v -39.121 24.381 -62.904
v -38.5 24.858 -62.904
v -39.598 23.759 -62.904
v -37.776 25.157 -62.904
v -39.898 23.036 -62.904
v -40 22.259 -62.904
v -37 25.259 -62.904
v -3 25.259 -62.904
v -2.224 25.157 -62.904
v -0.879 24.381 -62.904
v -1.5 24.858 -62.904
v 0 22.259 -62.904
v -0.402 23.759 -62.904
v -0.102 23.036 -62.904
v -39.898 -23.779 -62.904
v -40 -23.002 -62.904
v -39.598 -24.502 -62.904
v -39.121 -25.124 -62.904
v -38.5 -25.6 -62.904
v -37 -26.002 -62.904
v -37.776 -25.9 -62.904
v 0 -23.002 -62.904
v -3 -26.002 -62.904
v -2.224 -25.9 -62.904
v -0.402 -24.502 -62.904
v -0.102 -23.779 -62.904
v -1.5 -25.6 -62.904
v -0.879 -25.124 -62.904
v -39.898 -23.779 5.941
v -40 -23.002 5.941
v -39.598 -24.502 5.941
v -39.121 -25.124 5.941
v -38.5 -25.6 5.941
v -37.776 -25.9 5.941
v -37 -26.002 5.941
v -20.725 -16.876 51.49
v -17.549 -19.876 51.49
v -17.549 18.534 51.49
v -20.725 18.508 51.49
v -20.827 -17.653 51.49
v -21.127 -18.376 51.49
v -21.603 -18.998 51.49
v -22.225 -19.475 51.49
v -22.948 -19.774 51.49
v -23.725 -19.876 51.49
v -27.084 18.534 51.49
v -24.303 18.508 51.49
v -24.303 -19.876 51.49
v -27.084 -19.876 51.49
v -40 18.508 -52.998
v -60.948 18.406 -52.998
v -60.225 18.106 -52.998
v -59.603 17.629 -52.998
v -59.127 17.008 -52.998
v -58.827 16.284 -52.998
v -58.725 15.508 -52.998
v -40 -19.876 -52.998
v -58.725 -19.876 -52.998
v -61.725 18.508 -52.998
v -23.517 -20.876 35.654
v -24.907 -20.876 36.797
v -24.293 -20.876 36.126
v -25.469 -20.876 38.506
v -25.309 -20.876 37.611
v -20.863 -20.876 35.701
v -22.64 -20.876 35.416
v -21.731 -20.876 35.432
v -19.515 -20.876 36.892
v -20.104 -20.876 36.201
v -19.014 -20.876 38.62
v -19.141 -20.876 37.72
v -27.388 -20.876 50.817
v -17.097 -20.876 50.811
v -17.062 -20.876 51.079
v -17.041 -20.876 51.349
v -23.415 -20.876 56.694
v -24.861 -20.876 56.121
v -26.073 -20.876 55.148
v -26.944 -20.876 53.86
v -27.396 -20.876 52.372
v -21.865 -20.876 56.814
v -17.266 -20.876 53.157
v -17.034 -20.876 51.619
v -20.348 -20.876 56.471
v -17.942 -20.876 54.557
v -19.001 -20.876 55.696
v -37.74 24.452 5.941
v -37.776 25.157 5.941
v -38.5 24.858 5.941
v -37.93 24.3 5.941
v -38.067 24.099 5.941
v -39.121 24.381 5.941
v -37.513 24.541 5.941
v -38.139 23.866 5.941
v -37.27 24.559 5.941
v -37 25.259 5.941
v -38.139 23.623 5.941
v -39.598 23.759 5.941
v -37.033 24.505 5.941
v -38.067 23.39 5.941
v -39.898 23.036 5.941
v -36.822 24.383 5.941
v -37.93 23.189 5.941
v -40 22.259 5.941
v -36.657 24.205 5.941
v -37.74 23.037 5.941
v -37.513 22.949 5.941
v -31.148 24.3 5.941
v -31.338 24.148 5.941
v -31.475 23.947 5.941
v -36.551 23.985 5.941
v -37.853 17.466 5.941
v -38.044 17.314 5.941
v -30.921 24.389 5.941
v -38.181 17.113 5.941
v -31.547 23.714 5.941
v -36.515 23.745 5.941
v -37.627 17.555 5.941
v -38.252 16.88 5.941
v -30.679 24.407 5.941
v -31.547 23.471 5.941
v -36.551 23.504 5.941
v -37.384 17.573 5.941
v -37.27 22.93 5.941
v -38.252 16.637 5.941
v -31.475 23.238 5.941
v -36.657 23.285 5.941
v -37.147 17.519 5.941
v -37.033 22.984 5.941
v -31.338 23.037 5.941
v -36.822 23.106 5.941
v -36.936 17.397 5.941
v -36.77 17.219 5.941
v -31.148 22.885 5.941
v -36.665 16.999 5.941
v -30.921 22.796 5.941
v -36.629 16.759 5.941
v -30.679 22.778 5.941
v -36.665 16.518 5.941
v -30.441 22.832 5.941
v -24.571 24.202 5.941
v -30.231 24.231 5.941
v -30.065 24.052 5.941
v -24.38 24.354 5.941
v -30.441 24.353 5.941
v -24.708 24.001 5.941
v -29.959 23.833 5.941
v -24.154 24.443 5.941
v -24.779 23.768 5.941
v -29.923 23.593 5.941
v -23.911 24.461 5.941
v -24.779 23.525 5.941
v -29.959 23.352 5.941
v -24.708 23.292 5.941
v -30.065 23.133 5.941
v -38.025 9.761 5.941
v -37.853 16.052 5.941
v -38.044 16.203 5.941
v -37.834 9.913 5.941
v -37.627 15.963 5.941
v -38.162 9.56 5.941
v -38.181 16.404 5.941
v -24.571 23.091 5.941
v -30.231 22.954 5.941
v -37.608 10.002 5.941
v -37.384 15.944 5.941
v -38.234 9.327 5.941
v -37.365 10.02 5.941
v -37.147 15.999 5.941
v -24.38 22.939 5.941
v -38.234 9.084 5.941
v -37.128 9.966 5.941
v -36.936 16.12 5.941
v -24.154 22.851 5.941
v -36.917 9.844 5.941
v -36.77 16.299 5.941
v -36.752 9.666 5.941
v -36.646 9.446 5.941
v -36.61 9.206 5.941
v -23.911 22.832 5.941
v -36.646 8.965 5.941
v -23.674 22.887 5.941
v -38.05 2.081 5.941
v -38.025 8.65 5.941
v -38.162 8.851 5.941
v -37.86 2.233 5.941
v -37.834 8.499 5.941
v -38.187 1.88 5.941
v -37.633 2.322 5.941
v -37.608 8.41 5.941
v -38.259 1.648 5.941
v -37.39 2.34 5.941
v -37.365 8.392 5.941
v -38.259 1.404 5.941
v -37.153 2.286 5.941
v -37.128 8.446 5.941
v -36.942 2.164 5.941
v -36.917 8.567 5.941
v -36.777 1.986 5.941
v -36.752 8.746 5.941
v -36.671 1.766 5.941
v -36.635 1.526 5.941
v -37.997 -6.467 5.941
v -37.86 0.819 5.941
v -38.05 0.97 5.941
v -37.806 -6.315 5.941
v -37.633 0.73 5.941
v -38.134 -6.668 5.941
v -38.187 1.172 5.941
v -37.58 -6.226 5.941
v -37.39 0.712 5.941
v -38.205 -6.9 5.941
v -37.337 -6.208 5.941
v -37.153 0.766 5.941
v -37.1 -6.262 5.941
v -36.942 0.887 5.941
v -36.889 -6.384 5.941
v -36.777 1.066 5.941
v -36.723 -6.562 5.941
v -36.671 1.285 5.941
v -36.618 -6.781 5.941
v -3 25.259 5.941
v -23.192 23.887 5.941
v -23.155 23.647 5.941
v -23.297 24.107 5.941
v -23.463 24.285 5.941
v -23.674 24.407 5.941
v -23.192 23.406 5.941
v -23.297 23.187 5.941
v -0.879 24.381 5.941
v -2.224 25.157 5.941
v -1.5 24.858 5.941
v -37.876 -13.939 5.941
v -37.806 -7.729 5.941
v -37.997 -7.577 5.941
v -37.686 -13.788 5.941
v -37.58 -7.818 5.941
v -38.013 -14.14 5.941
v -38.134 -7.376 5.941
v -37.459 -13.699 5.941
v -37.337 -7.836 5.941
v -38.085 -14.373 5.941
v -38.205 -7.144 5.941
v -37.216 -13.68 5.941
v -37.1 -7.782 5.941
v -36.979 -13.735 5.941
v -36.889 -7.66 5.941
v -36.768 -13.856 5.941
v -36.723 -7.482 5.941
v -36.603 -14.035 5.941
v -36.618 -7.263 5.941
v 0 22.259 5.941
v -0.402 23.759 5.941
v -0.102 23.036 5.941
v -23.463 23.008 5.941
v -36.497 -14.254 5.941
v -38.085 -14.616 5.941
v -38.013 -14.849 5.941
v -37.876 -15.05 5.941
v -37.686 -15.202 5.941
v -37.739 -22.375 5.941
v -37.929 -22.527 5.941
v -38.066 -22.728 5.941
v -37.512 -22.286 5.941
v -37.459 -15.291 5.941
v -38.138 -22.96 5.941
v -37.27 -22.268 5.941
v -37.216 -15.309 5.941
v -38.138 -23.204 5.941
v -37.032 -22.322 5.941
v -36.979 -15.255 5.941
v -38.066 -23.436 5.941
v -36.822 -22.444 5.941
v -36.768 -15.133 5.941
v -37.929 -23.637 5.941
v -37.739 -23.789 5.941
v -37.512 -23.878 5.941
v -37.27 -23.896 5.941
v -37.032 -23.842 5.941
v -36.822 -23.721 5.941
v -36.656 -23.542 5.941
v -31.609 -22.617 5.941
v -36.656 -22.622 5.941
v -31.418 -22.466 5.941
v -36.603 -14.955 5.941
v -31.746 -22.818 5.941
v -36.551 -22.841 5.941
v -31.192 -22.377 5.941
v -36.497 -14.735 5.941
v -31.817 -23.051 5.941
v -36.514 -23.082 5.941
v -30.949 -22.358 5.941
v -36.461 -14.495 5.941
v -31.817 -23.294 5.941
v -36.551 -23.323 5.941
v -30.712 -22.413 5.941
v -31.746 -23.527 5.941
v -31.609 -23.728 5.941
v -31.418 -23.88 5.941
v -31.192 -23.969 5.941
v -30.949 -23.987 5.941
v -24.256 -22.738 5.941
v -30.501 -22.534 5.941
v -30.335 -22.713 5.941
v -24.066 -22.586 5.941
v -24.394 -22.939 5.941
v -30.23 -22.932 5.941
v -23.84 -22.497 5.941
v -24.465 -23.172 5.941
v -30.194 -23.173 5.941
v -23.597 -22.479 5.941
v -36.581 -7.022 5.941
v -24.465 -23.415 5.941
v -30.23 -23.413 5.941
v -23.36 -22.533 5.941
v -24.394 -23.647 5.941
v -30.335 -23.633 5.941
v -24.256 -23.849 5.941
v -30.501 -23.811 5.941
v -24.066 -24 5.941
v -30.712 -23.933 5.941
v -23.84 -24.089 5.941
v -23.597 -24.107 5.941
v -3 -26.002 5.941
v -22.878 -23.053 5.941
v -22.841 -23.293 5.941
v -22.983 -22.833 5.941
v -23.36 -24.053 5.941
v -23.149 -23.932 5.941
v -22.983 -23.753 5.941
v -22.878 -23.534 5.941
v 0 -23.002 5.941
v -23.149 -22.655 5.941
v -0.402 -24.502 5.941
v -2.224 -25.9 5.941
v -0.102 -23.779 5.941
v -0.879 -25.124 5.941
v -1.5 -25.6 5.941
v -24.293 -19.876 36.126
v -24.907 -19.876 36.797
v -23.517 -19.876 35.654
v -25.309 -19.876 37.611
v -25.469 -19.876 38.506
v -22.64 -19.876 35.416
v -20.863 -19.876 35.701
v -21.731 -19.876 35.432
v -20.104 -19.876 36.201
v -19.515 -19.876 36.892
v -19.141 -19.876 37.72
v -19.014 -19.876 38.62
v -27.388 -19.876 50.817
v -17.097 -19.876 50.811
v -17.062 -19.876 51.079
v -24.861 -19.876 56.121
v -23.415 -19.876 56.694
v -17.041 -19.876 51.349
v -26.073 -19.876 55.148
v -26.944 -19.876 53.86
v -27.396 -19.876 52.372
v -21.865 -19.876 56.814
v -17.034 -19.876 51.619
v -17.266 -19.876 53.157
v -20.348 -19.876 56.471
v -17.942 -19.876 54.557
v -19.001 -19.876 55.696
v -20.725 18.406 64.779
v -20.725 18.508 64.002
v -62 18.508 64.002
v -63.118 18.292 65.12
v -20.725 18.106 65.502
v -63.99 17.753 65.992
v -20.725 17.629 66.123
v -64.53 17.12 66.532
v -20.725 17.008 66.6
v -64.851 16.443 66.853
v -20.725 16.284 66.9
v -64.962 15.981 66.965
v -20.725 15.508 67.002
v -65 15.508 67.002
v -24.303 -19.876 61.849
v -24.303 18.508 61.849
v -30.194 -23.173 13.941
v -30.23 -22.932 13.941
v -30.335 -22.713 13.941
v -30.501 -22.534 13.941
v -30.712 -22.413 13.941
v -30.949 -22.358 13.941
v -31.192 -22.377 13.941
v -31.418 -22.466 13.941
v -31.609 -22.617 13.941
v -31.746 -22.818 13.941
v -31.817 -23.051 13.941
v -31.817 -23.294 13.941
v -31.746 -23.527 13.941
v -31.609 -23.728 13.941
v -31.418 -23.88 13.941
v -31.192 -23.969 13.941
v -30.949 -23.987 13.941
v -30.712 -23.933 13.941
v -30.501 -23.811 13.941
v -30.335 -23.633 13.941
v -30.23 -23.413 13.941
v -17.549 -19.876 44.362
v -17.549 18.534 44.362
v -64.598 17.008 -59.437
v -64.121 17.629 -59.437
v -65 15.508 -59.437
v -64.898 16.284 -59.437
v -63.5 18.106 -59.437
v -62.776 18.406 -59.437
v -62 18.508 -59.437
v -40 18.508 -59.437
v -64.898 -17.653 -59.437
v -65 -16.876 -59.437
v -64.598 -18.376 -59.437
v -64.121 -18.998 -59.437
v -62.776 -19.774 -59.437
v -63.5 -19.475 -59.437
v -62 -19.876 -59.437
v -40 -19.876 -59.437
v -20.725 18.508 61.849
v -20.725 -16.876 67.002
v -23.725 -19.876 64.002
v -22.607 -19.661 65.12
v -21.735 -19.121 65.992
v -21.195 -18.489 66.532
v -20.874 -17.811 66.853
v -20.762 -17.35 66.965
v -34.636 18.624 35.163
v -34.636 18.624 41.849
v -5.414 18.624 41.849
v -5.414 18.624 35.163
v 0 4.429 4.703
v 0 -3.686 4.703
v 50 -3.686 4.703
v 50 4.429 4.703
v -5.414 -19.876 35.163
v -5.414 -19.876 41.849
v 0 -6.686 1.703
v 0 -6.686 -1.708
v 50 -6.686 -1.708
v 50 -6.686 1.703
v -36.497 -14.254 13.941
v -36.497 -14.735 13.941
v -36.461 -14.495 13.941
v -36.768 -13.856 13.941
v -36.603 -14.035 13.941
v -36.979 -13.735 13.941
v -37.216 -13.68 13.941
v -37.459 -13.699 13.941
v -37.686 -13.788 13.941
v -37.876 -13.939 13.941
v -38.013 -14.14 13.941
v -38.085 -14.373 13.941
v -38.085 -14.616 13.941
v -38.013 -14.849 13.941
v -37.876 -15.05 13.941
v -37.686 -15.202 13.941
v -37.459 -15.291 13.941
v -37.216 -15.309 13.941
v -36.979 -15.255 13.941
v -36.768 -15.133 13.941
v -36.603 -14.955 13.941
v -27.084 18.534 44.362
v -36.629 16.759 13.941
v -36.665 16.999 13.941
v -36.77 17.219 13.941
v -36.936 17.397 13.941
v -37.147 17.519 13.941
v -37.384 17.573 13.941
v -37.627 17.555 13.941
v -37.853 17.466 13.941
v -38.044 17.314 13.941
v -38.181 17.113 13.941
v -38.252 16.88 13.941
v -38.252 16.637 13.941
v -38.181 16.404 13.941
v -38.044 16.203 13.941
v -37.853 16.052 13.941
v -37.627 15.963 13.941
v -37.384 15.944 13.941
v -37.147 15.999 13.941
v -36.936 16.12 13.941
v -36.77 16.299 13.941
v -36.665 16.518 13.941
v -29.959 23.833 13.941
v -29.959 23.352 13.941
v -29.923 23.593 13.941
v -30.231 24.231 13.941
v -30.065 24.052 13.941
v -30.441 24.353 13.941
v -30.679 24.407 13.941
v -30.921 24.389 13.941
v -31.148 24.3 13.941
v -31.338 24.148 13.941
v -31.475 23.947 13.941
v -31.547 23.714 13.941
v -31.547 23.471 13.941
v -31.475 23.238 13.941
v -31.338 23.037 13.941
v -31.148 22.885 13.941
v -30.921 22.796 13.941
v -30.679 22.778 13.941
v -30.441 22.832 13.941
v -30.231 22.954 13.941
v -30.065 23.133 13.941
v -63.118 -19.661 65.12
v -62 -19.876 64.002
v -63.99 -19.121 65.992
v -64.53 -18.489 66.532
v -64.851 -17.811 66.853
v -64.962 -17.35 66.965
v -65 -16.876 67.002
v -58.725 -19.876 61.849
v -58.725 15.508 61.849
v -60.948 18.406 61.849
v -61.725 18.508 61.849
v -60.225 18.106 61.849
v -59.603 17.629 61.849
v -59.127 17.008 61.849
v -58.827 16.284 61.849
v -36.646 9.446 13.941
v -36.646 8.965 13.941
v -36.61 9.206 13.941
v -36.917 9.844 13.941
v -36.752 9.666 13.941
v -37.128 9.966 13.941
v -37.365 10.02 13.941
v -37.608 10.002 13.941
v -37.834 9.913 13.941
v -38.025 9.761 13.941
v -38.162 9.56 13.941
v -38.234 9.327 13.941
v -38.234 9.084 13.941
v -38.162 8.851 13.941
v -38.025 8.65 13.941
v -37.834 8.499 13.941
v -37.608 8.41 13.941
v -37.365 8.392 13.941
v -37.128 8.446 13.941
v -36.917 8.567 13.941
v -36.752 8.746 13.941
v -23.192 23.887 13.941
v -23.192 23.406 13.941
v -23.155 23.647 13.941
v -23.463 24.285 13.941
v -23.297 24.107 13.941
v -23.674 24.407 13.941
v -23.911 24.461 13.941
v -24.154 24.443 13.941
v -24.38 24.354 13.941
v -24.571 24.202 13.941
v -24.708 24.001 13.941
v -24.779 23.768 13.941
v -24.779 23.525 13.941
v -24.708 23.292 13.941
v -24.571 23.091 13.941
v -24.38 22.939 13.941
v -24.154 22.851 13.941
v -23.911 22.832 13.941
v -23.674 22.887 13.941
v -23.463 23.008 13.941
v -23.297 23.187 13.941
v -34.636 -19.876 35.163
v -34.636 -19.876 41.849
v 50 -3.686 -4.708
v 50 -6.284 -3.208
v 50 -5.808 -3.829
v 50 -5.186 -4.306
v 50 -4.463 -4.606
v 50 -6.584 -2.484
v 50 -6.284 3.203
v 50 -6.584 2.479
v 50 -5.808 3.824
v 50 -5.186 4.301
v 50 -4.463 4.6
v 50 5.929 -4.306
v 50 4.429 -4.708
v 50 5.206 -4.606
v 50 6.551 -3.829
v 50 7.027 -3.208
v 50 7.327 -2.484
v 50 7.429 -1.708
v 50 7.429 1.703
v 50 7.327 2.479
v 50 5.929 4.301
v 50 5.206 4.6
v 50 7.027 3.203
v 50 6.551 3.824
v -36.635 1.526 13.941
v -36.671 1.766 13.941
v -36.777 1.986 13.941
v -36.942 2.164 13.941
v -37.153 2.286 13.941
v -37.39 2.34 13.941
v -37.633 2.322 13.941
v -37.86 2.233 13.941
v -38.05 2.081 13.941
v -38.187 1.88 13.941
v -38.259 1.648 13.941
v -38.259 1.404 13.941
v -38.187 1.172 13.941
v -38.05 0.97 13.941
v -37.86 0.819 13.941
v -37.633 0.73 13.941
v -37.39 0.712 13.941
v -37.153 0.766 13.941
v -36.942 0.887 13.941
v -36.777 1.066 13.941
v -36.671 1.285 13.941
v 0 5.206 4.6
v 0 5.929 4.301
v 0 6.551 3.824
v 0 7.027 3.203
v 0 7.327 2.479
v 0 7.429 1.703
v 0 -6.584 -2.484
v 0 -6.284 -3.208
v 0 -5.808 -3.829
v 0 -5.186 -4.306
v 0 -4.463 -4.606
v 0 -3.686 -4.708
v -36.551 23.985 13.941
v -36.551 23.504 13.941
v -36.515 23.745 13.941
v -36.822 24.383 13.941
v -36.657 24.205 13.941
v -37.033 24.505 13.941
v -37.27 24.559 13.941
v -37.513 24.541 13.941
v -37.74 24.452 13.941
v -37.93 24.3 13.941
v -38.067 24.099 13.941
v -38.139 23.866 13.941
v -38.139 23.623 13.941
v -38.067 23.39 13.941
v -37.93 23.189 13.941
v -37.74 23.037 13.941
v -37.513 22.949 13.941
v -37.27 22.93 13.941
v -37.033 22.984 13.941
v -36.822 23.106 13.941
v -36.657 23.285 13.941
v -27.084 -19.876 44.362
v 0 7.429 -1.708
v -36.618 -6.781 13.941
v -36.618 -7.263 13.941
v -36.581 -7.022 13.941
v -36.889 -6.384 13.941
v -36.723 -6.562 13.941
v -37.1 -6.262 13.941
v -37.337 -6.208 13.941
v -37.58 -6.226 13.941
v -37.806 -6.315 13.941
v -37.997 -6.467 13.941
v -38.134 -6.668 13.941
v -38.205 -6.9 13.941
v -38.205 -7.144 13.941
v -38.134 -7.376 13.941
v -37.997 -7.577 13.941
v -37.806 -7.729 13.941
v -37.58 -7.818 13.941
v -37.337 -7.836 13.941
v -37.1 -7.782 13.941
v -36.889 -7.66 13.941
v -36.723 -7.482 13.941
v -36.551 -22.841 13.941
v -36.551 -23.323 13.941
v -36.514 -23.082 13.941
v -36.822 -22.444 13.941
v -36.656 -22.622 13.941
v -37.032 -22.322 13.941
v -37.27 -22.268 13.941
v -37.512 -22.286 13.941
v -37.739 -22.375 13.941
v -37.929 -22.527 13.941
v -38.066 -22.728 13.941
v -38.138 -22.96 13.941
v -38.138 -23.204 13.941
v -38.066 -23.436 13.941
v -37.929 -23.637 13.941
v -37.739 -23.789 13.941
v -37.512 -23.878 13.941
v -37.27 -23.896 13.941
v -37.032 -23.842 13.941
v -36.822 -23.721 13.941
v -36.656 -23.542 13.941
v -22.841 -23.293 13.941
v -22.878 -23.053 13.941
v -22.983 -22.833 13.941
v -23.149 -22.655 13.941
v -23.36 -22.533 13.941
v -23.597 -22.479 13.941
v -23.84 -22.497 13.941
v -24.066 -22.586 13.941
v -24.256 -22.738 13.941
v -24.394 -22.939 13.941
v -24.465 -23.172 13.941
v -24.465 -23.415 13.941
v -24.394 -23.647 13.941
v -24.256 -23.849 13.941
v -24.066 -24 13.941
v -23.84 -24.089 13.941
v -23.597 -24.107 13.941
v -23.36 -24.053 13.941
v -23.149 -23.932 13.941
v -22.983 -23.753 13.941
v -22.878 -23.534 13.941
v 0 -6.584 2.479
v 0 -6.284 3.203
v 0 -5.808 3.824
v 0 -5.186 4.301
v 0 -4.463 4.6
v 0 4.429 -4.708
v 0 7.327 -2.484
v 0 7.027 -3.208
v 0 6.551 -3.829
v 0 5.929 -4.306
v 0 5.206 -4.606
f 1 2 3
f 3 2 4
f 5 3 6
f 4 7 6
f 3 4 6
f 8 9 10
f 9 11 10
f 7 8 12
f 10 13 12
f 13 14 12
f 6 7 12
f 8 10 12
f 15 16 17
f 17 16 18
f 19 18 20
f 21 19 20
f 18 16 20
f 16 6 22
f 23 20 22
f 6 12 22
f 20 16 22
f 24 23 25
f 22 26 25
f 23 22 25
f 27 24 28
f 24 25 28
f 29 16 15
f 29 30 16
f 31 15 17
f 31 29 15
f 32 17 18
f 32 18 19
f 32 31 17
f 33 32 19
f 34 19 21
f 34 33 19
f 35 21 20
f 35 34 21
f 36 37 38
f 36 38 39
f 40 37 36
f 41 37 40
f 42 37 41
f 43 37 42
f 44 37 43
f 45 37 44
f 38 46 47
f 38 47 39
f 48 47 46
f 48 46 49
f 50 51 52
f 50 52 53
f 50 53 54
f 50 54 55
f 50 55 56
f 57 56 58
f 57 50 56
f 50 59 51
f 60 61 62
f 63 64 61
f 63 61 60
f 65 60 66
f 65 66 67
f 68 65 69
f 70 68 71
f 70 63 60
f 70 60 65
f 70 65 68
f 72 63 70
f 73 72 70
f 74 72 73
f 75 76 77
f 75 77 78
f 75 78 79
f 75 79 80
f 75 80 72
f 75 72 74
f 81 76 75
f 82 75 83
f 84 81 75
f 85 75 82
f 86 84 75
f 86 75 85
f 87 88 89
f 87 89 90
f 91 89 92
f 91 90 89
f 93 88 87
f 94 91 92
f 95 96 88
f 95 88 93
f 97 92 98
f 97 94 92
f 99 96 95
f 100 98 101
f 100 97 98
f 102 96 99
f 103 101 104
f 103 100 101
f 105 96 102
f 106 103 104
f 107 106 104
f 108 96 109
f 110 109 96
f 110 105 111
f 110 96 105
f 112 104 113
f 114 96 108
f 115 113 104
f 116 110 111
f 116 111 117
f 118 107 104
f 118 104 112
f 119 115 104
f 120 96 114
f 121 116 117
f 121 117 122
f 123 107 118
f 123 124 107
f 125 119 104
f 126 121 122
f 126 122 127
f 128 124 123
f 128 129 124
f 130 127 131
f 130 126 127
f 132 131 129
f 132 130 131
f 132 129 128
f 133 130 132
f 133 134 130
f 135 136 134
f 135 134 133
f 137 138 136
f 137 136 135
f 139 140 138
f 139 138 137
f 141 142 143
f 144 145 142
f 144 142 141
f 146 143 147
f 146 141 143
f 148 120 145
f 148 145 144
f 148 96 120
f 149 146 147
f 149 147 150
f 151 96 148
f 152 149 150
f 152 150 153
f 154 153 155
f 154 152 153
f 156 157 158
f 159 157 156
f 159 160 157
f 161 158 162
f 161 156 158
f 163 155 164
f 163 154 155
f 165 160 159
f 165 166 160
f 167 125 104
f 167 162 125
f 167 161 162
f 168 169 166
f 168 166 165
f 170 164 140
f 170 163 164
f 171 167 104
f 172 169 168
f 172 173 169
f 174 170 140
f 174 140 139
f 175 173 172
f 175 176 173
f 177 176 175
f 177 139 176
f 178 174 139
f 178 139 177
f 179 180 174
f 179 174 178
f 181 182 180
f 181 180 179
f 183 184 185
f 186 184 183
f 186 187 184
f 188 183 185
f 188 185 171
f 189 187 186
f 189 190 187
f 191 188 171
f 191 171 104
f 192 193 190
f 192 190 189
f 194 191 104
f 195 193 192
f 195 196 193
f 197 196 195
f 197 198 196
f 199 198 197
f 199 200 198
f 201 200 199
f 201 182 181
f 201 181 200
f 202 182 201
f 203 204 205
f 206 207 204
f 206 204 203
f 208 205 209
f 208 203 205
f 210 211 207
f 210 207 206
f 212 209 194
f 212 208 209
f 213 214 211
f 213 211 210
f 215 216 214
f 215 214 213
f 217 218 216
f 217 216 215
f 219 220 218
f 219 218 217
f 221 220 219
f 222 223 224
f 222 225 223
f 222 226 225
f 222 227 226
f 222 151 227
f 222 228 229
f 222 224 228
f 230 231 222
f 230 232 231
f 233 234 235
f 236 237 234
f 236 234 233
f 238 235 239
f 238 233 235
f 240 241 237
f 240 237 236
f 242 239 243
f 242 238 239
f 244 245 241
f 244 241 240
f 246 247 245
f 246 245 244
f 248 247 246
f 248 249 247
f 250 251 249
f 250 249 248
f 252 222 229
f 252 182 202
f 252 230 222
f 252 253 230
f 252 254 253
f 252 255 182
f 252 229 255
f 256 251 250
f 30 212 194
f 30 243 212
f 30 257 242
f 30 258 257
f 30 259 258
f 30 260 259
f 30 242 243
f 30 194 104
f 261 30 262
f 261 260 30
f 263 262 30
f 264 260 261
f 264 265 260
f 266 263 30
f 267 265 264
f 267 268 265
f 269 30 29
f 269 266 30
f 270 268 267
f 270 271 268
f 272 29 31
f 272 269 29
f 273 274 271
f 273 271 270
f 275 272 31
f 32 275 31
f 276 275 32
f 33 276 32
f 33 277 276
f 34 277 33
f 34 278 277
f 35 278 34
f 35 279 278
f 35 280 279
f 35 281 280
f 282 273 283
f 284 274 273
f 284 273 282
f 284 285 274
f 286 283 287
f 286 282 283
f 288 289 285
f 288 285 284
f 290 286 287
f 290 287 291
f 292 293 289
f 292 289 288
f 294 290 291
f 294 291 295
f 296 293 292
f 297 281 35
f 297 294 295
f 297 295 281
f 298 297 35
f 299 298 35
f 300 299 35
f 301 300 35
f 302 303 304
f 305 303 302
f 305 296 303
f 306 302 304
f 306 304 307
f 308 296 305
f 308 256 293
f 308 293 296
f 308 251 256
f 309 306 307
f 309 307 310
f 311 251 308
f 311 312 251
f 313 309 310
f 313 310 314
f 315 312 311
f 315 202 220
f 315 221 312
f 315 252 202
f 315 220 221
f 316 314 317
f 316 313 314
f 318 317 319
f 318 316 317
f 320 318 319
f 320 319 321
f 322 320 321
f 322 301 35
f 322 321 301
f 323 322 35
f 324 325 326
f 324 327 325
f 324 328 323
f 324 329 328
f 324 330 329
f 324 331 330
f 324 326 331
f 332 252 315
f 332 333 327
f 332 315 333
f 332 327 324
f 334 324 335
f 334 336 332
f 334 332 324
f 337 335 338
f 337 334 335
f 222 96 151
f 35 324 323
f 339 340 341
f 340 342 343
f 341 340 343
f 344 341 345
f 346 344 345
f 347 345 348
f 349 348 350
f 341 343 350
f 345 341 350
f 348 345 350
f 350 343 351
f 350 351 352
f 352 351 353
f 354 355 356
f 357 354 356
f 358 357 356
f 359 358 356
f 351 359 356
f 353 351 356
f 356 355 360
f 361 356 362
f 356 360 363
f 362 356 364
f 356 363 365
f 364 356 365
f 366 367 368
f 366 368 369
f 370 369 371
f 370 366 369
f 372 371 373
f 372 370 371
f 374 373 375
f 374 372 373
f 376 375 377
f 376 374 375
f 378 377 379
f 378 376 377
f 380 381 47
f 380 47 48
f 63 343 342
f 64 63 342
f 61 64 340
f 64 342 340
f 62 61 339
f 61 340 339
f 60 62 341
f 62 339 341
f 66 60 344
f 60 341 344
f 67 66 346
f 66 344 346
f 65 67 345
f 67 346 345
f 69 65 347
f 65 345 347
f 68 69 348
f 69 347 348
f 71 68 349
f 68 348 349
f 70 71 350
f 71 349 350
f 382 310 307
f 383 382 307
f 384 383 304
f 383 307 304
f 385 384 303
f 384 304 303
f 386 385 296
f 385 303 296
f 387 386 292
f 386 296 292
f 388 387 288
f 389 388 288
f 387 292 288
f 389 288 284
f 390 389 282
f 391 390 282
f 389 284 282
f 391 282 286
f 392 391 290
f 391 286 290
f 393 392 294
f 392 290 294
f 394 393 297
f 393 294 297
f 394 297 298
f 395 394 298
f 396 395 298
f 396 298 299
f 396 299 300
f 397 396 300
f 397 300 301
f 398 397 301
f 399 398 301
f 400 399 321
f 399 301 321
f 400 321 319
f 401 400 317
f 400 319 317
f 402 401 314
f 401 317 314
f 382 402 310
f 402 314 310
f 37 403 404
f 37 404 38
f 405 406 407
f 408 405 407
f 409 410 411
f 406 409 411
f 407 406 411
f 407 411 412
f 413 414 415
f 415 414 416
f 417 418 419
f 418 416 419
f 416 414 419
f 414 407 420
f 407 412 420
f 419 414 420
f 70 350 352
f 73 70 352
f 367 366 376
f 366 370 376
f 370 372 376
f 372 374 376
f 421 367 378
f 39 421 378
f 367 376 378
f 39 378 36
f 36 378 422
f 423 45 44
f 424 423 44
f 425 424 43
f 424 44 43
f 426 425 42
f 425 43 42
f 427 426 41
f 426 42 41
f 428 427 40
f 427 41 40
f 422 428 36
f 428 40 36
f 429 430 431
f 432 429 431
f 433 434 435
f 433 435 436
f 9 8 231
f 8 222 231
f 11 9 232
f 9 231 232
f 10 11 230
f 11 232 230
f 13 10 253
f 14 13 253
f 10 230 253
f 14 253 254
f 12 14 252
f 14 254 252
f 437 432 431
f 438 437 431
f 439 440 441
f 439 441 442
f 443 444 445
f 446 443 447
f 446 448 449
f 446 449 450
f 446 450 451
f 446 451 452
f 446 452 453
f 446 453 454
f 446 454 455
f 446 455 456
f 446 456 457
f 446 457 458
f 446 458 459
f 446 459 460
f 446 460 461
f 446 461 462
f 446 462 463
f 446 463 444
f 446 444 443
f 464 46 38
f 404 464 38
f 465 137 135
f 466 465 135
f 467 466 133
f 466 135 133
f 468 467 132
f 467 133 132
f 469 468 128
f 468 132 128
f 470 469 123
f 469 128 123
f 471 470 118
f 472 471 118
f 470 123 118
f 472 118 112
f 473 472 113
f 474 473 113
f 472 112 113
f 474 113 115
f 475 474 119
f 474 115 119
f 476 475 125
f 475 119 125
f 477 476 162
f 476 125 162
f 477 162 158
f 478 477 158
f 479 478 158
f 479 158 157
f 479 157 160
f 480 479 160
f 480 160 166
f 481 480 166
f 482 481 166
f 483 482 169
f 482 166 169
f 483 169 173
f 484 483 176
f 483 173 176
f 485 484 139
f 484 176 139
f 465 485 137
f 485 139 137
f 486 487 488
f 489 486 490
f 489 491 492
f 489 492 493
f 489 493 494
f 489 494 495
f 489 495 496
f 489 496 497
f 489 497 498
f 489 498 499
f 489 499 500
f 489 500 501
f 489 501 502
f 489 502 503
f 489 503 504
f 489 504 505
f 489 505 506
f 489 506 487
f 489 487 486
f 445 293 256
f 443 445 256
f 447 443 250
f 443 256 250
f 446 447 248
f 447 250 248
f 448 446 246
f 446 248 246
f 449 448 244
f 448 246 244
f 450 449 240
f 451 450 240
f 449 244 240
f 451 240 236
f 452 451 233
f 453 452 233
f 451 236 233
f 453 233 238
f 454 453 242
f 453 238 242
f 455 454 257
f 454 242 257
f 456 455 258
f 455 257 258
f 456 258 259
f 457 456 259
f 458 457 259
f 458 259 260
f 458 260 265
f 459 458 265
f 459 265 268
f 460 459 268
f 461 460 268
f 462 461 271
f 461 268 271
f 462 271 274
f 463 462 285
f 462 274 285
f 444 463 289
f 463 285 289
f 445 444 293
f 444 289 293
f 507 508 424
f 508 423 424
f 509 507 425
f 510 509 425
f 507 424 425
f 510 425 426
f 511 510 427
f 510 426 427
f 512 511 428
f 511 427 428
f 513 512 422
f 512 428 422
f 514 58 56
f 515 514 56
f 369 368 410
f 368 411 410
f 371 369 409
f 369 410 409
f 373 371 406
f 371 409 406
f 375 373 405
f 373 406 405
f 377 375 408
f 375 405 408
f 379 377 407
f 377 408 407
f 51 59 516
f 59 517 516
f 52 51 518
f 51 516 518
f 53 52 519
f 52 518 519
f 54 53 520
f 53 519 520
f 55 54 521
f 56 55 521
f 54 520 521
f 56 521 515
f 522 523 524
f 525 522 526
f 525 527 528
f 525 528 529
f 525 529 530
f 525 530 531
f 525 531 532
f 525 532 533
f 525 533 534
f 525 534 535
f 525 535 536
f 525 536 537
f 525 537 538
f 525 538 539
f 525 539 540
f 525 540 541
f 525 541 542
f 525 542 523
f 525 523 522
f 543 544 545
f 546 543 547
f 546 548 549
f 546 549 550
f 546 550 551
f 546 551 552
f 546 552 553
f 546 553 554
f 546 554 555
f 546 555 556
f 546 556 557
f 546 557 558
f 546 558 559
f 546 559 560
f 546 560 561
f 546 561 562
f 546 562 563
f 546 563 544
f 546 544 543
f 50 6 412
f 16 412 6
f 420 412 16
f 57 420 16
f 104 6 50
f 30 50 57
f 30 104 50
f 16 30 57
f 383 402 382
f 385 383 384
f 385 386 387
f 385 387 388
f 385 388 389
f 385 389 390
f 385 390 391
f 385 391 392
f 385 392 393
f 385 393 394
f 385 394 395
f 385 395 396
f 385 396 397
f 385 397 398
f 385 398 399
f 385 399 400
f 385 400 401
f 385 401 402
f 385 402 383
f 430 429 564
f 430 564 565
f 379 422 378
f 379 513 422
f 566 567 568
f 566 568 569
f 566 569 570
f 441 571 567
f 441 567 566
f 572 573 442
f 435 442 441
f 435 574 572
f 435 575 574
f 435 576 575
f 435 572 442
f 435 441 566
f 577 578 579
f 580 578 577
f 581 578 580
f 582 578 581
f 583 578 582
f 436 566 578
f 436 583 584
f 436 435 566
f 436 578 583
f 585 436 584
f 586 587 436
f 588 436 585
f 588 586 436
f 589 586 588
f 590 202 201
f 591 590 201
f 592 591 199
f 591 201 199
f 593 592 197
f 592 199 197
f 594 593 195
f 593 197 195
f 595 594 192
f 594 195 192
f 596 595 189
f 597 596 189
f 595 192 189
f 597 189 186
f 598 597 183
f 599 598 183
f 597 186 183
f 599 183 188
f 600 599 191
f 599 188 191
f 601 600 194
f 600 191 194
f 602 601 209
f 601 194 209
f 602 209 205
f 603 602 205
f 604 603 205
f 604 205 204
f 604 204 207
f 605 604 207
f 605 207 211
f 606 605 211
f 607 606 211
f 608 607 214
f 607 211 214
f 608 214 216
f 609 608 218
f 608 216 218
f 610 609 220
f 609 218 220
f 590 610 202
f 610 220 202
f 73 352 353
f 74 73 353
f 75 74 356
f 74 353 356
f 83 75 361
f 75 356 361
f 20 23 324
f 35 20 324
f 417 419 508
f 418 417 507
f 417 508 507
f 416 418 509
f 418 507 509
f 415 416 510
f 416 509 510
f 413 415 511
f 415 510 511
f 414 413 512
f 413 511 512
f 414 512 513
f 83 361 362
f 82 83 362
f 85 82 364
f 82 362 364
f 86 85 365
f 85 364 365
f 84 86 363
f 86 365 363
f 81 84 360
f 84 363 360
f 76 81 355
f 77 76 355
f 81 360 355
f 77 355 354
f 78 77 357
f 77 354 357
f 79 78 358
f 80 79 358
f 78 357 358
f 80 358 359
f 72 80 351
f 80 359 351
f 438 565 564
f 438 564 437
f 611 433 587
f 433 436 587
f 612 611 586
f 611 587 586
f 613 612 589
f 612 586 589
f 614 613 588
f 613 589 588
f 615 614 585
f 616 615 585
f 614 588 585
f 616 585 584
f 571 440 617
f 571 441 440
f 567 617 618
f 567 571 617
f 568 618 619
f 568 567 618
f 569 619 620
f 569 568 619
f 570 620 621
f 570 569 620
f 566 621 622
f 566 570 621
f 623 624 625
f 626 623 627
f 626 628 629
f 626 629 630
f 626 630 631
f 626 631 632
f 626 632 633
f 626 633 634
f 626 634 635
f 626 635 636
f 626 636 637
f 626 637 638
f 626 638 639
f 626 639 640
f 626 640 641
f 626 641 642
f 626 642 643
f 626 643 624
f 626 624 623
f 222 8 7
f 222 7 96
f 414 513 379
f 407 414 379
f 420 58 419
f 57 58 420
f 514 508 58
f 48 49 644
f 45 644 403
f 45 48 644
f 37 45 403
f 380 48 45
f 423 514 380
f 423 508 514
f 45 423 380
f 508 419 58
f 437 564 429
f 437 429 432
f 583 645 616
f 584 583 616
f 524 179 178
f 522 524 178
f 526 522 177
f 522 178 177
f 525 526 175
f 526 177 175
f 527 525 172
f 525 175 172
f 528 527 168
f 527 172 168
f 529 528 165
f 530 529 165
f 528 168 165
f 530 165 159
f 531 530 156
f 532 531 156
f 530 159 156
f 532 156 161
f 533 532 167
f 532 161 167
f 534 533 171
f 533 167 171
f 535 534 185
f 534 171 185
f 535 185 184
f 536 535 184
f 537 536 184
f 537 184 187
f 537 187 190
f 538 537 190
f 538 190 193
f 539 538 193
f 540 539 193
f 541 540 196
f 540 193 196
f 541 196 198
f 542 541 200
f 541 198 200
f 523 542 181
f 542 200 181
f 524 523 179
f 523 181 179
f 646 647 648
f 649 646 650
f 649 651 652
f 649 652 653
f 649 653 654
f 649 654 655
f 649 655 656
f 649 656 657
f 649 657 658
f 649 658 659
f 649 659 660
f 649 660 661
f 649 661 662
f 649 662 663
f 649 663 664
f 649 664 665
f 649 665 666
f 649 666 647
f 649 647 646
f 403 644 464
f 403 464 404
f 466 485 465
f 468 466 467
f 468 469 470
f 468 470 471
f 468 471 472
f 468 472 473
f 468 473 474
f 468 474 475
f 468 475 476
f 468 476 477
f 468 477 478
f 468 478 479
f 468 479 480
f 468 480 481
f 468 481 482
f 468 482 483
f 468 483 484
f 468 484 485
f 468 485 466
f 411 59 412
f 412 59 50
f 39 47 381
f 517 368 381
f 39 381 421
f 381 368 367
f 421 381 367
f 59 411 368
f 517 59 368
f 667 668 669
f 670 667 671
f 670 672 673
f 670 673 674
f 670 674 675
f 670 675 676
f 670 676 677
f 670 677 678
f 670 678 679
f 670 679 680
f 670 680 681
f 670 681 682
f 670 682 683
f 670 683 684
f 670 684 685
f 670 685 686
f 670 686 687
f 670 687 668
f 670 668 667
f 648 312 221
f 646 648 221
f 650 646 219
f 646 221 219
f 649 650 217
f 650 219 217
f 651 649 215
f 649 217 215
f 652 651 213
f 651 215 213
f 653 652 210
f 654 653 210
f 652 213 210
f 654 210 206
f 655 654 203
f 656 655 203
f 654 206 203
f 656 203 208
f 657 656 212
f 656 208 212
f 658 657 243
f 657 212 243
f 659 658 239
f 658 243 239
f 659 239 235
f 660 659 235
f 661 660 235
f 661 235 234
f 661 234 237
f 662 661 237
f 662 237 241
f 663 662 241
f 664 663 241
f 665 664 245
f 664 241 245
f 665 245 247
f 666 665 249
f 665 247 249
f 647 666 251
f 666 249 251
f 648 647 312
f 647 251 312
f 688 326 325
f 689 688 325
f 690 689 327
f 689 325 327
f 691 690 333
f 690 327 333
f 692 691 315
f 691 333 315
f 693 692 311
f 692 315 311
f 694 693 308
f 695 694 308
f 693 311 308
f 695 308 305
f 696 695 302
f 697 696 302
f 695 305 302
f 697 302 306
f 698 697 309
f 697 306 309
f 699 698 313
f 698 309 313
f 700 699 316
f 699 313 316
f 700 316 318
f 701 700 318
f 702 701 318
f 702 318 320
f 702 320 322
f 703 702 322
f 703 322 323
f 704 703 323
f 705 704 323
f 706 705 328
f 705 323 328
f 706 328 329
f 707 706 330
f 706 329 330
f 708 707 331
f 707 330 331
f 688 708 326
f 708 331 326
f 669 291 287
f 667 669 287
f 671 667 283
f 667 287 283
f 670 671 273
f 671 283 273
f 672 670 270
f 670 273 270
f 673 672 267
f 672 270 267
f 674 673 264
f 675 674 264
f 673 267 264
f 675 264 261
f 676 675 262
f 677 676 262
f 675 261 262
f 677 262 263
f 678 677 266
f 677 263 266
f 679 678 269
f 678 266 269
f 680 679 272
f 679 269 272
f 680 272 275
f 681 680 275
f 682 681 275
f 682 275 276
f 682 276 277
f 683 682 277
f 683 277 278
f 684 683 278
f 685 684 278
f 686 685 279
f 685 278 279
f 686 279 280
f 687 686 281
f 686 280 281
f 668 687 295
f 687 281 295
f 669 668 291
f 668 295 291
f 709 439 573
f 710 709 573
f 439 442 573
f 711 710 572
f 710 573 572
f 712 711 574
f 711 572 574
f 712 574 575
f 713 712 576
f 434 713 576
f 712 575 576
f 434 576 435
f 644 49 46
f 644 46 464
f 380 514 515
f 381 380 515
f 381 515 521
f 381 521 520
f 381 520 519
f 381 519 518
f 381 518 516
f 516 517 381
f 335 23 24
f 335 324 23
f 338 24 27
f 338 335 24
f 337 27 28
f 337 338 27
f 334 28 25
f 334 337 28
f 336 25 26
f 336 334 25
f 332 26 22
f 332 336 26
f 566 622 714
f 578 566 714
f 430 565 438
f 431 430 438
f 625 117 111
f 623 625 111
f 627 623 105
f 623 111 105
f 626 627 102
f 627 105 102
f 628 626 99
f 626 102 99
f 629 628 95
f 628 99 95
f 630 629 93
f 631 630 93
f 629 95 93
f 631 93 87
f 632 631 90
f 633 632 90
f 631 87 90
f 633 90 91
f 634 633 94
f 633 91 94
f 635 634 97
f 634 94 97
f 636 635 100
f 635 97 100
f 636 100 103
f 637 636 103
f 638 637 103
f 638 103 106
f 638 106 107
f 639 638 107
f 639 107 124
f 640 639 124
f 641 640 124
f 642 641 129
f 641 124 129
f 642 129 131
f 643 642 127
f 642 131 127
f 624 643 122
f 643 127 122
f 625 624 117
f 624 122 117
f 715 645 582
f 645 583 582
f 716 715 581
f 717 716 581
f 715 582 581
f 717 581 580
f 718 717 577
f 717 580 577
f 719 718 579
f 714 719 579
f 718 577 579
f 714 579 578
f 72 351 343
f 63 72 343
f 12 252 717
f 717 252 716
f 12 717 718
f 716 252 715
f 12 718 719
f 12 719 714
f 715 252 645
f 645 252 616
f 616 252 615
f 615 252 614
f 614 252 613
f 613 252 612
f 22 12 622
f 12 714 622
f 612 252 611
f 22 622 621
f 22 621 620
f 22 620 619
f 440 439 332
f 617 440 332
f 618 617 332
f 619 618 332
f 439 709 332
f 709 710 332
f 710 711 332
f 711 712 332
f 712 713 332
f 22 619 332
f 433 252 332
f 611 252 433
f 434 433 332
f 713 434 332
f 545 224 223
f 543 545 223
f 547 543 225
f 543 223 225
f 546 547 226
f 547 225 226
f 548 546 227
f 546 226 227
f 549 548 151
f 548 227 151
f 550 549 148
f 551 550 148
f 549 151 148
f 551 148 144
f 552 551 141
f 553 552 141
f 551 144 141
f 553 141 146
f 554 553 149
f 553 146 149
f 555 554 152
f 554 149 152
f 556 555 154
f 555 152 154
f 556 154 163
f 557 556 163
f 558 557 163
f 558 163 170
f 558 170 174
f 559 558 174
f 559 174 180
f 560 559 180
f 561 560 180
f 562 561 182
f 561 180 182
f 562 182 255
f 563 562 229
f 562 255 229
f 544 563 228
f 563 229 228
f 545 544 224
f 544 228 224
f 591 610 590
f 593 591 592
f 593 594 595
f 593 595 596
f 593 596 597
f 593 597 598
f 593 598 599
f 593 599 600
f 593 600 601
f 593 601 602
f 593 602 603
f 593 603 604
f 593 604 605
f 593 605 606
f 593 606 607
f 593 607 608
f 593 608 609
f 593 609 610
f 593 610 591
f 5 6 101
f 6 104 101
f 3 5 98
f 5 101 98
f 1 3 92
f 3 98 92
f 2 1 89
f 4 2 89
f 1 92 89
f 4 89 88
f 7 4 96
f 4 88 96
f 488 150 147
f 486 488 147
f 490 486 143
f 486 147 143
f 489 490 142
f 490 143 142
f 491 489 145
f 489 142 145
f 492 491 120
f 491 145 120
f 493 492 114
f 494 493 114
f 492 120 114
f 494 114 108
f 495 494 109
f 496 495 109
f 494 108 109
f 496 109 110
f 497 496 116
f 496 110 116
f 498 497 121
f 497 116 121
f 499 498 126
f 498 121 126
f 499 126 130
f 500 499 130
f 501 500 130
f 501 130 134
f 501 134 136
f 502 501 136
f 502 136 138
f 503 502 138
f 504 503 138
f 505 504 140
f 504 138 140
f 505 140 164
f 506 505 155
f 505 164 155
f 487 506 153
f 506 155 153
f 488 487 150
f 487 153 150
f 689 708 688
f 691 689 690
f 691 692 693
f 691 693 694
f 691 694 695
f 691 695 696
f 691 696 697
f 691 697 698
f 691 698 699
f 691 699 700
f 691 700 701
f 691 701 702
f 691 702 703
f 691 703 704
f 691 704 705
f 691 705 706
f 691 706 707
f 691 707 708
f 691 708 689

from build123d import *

# Parameters (mm, degrees)
F0_W      = 14.1155663878
F0_H      = 9.4103775918
F1_DEPTH  = 50
F2_W      = 51.2617919594
F2_H      = 68.8443407416
F3_DEPTH  = 40
F4_W      = 38.3844356984
F4_H      = 6.4386762679
F5_DEPTH  = 25
F6_W      = 6.2752501667
F6_H      = 38.3844356984
F7_DEPTH  = 120
F8_W      = 38.3844356984
F8_H      = 5.1532968879
F9_DEPTH  = 38
F10_W     = 3.5778277665
F10_H     = 38.3844356984
F11_DEPTH = 15
F12_W     = 3.5778277665
F12_H     = 4.6407681704
F13_DEPTH = 38.41
F14_W     = 29.2216986418
F14_H     = 6.686322391
F15_DEPTH = 38.5
F16_R     = 0.8165203792
F17_DEPTH = 8
F19_DEPTH = 1
F20_R     = 3


with BuildPart() as f1:
    # F0 (on Right) → F1 (new body)
    with BuildSketch(Plane.YZ):
        with Locations((0.3714626655, -0.0025788322)):
            Rectangle(F0_W, F0_H)
    extrude(amount=F1_DEPTH)

    # F2 (on face) → F3 (join)
    with BuildSketch(Plane(origin=(0, 0, 0), x_dir=(0, -1, 0), z_dir=(-1, 0, 0))):
        with Locations((0.3714608029, -28.4813530743)):
            Rectangle(F2_W, F2_H)
    extrude(amount=F3_DEPTH)

    # F4 (on face) → F5 (join)
    with BuildSketch(Plane(origin=(-40, 0, 0), x_dir=(0, -1, 0), z_dir=(-1, 0, 0))):
        with Locations((0.6842287257, -56.2172029167)):
            Rectangle(F4_W, F4_H)
    extrude(amount=F5_DEPTH)

    # F6 (on face) → F7 (join)
    with BuildSketch(Plane.XY.offset(-52.9978647828)):
        with Locations((-61.8623749167, -0.6842287257)):
            Rectangle(F6_W, F6_H)
    extrude(amount=F7_DEPTH)

    # F8 (on face) → F9 (join)
    with BuildSketch(Plane.YZ.offset(-58.7247498333)):
        with Locations((-0.6842287257, 64.4254867733)):
            Rectangle(F8_W, F8_H)
    extrude(amount=F9_DEPTH)

    # F10 (on face) → F11 (join)
    with BuildSketch(Plane(origin=(0, 0, 61.8488383293), x_dir=(1, 0, 0), z_dir=(0, 0, -1))):
        with Locations((-22.5136637166, 0.6842287257)):
            Rectangle(F10_W, F10_H)
    extrude(amount=F11_DEPTH)

    # F12 (on face) → F13 (join)
    with BuildSketch(Plane.XZ.offset(19.8764465749)):
        Polygon((-24.3025775999, 51.4896064997), (-27.0836036652, 51.4896064997), (-27.0836036652, 44.3622171879), (-17.5488386303, 44.3622171879), (-17.5488386303, 51.4896064997), (-20.7247498333, 51.4896064997), (-20.7247498333, 46.8488383293), (-24.3025775999, 46.8488383293), align=None)
        with Locations((-22.5136637166, 49.1692224145)):
            Rectangle(F12_W, F12_H)
    extrude(amount=-F13_DEPTH)

    # F16 (on face) → F17 (join)
    with BuildSketch(Plane.XY.offset(5.9408172965)):
        with Locations((-37.3312607408, 23.7445700914)):
            Circle(F16_R)
        with Locations((-30.7396166027, 23.5925223678)):
            Circle(F16_R)
        with Locations((-23.9719599485, 23.6466173083)):
            Circle(F16_R)
        with Locations((-37.4450609088, 16.7587026954)):
            Circle(F16_R)
        with Locations((-37.426199764, 9.2057716101)):
            Circle(F16_R)
        with Locations((-37.4512858689, 1.5258083586)):
            Circle(F16_R)
        with Locations((-37.3307578266, -23.0821233708)):
            Circle(F16_R)
        with Locations((-37.3979955912, -7.0219798945)):
            Circle(F16_R)
        with Locations((-37.2774675488, -14.4946947694)):
            Circle(F16_R)
        with Locations((-31.0100317001, -23.1726877391)):
            Circle(F16_R)
        with Locations((-23.6578416079, -23.2932139188)):
            Circle(F16_R)
    extrude(amount=F17_DEPTH)

    # F20
    f20_edges = [f1.edges().sort_by_distance(p)[0] for p in [
        (-65, -19.876447, 3.782797),
        (-42.862375, -19.876447, 67.002135),
        (-20.72475, -19.876447, 59.245871),
        (-40, -26.002357, -28.481353),
        (25, -6.686321, 4.70261),
        (25, -6.686321, -4.707768),
        (25, 7.429246, -4.707768),
        (25, 7.429246, 4.70261),
        (-40, 25.259435, -28.481353),
        (0, 25.259435, -28.481353),
        (0, -26.002357, -28.481353),
        (-58.72475, 18.507989, 4.425487),
        (-42.862375, 18.507989, 67.002135),
        (-65, 18.507989, 3.782797),
    ]]
    fillet(f20_edges, radius=F20_R)


with BuildPart() as f15:
    # F14 (on face) → F15 (new body)
    with BuildSketch(Plane.XZ.offset(19.8764465749)):
        with Locations((-20.0252532959, 38.5056771338)):
            Rectangle(F14_W, F14_H)
    extrude(amount=-F15_DEPTH)


with BuildPart() as f19:
    # F18 (on face) → F19 (new body)
    with BuildSketch(Plane.XZ.offset(19.8764465749)):
        with BuildLine():
            ThreePointArc((-17.0973843084, 50.8105079987), (-17.0500270651, 51.2136435714), (-17.03420929, 51.6192428768))
            ThreePointArc((-17.03420929, 51.6192428768), (-22.6446186845, 56.8117772873), (-27.3882469123, 50.8170213778))
            ThreePointArc((-27.3882469123, 50.8170213778), (-22.2456021518, 46.4111474096), (-17.0973843084, 50.8105079987))
        make_face()
        with BuildLine():
            ThreePointArc((-17.0973843084, 50.8105079987), (-22.2456021518, 46.4111474096), (-27.3882469123, 50.8170213778))
            Line((-27.3882469123, 50.8170213778), (-25.4689818412, 38.5056771338))
            ThreePointArc((-25.4689818412, 38.5056771338), (-22.2995427044, 41.8483309556), (-19.0136004239, 38.6201329529))
            Line((-19.0136004239, 38.6201329529), (-17.0973843084, 50.8105079987))
        make_face()
        with BuildLine():
            ThreePointArc((-19.0136004239, 38.6201329529), (-22.2995427044, 41.8483309556), (-25.4689818412, 38.5056771338))
            ThreePointArc((-25.4689818412, 38.5056771338), (-22.1850688963, 35.3919349503), (-19.0136004239, 38.6201329529))
        make_face()
    extrude(amount=F19_DEPTH)


solid = Compound([f1.part, f15.part, f19.part])
